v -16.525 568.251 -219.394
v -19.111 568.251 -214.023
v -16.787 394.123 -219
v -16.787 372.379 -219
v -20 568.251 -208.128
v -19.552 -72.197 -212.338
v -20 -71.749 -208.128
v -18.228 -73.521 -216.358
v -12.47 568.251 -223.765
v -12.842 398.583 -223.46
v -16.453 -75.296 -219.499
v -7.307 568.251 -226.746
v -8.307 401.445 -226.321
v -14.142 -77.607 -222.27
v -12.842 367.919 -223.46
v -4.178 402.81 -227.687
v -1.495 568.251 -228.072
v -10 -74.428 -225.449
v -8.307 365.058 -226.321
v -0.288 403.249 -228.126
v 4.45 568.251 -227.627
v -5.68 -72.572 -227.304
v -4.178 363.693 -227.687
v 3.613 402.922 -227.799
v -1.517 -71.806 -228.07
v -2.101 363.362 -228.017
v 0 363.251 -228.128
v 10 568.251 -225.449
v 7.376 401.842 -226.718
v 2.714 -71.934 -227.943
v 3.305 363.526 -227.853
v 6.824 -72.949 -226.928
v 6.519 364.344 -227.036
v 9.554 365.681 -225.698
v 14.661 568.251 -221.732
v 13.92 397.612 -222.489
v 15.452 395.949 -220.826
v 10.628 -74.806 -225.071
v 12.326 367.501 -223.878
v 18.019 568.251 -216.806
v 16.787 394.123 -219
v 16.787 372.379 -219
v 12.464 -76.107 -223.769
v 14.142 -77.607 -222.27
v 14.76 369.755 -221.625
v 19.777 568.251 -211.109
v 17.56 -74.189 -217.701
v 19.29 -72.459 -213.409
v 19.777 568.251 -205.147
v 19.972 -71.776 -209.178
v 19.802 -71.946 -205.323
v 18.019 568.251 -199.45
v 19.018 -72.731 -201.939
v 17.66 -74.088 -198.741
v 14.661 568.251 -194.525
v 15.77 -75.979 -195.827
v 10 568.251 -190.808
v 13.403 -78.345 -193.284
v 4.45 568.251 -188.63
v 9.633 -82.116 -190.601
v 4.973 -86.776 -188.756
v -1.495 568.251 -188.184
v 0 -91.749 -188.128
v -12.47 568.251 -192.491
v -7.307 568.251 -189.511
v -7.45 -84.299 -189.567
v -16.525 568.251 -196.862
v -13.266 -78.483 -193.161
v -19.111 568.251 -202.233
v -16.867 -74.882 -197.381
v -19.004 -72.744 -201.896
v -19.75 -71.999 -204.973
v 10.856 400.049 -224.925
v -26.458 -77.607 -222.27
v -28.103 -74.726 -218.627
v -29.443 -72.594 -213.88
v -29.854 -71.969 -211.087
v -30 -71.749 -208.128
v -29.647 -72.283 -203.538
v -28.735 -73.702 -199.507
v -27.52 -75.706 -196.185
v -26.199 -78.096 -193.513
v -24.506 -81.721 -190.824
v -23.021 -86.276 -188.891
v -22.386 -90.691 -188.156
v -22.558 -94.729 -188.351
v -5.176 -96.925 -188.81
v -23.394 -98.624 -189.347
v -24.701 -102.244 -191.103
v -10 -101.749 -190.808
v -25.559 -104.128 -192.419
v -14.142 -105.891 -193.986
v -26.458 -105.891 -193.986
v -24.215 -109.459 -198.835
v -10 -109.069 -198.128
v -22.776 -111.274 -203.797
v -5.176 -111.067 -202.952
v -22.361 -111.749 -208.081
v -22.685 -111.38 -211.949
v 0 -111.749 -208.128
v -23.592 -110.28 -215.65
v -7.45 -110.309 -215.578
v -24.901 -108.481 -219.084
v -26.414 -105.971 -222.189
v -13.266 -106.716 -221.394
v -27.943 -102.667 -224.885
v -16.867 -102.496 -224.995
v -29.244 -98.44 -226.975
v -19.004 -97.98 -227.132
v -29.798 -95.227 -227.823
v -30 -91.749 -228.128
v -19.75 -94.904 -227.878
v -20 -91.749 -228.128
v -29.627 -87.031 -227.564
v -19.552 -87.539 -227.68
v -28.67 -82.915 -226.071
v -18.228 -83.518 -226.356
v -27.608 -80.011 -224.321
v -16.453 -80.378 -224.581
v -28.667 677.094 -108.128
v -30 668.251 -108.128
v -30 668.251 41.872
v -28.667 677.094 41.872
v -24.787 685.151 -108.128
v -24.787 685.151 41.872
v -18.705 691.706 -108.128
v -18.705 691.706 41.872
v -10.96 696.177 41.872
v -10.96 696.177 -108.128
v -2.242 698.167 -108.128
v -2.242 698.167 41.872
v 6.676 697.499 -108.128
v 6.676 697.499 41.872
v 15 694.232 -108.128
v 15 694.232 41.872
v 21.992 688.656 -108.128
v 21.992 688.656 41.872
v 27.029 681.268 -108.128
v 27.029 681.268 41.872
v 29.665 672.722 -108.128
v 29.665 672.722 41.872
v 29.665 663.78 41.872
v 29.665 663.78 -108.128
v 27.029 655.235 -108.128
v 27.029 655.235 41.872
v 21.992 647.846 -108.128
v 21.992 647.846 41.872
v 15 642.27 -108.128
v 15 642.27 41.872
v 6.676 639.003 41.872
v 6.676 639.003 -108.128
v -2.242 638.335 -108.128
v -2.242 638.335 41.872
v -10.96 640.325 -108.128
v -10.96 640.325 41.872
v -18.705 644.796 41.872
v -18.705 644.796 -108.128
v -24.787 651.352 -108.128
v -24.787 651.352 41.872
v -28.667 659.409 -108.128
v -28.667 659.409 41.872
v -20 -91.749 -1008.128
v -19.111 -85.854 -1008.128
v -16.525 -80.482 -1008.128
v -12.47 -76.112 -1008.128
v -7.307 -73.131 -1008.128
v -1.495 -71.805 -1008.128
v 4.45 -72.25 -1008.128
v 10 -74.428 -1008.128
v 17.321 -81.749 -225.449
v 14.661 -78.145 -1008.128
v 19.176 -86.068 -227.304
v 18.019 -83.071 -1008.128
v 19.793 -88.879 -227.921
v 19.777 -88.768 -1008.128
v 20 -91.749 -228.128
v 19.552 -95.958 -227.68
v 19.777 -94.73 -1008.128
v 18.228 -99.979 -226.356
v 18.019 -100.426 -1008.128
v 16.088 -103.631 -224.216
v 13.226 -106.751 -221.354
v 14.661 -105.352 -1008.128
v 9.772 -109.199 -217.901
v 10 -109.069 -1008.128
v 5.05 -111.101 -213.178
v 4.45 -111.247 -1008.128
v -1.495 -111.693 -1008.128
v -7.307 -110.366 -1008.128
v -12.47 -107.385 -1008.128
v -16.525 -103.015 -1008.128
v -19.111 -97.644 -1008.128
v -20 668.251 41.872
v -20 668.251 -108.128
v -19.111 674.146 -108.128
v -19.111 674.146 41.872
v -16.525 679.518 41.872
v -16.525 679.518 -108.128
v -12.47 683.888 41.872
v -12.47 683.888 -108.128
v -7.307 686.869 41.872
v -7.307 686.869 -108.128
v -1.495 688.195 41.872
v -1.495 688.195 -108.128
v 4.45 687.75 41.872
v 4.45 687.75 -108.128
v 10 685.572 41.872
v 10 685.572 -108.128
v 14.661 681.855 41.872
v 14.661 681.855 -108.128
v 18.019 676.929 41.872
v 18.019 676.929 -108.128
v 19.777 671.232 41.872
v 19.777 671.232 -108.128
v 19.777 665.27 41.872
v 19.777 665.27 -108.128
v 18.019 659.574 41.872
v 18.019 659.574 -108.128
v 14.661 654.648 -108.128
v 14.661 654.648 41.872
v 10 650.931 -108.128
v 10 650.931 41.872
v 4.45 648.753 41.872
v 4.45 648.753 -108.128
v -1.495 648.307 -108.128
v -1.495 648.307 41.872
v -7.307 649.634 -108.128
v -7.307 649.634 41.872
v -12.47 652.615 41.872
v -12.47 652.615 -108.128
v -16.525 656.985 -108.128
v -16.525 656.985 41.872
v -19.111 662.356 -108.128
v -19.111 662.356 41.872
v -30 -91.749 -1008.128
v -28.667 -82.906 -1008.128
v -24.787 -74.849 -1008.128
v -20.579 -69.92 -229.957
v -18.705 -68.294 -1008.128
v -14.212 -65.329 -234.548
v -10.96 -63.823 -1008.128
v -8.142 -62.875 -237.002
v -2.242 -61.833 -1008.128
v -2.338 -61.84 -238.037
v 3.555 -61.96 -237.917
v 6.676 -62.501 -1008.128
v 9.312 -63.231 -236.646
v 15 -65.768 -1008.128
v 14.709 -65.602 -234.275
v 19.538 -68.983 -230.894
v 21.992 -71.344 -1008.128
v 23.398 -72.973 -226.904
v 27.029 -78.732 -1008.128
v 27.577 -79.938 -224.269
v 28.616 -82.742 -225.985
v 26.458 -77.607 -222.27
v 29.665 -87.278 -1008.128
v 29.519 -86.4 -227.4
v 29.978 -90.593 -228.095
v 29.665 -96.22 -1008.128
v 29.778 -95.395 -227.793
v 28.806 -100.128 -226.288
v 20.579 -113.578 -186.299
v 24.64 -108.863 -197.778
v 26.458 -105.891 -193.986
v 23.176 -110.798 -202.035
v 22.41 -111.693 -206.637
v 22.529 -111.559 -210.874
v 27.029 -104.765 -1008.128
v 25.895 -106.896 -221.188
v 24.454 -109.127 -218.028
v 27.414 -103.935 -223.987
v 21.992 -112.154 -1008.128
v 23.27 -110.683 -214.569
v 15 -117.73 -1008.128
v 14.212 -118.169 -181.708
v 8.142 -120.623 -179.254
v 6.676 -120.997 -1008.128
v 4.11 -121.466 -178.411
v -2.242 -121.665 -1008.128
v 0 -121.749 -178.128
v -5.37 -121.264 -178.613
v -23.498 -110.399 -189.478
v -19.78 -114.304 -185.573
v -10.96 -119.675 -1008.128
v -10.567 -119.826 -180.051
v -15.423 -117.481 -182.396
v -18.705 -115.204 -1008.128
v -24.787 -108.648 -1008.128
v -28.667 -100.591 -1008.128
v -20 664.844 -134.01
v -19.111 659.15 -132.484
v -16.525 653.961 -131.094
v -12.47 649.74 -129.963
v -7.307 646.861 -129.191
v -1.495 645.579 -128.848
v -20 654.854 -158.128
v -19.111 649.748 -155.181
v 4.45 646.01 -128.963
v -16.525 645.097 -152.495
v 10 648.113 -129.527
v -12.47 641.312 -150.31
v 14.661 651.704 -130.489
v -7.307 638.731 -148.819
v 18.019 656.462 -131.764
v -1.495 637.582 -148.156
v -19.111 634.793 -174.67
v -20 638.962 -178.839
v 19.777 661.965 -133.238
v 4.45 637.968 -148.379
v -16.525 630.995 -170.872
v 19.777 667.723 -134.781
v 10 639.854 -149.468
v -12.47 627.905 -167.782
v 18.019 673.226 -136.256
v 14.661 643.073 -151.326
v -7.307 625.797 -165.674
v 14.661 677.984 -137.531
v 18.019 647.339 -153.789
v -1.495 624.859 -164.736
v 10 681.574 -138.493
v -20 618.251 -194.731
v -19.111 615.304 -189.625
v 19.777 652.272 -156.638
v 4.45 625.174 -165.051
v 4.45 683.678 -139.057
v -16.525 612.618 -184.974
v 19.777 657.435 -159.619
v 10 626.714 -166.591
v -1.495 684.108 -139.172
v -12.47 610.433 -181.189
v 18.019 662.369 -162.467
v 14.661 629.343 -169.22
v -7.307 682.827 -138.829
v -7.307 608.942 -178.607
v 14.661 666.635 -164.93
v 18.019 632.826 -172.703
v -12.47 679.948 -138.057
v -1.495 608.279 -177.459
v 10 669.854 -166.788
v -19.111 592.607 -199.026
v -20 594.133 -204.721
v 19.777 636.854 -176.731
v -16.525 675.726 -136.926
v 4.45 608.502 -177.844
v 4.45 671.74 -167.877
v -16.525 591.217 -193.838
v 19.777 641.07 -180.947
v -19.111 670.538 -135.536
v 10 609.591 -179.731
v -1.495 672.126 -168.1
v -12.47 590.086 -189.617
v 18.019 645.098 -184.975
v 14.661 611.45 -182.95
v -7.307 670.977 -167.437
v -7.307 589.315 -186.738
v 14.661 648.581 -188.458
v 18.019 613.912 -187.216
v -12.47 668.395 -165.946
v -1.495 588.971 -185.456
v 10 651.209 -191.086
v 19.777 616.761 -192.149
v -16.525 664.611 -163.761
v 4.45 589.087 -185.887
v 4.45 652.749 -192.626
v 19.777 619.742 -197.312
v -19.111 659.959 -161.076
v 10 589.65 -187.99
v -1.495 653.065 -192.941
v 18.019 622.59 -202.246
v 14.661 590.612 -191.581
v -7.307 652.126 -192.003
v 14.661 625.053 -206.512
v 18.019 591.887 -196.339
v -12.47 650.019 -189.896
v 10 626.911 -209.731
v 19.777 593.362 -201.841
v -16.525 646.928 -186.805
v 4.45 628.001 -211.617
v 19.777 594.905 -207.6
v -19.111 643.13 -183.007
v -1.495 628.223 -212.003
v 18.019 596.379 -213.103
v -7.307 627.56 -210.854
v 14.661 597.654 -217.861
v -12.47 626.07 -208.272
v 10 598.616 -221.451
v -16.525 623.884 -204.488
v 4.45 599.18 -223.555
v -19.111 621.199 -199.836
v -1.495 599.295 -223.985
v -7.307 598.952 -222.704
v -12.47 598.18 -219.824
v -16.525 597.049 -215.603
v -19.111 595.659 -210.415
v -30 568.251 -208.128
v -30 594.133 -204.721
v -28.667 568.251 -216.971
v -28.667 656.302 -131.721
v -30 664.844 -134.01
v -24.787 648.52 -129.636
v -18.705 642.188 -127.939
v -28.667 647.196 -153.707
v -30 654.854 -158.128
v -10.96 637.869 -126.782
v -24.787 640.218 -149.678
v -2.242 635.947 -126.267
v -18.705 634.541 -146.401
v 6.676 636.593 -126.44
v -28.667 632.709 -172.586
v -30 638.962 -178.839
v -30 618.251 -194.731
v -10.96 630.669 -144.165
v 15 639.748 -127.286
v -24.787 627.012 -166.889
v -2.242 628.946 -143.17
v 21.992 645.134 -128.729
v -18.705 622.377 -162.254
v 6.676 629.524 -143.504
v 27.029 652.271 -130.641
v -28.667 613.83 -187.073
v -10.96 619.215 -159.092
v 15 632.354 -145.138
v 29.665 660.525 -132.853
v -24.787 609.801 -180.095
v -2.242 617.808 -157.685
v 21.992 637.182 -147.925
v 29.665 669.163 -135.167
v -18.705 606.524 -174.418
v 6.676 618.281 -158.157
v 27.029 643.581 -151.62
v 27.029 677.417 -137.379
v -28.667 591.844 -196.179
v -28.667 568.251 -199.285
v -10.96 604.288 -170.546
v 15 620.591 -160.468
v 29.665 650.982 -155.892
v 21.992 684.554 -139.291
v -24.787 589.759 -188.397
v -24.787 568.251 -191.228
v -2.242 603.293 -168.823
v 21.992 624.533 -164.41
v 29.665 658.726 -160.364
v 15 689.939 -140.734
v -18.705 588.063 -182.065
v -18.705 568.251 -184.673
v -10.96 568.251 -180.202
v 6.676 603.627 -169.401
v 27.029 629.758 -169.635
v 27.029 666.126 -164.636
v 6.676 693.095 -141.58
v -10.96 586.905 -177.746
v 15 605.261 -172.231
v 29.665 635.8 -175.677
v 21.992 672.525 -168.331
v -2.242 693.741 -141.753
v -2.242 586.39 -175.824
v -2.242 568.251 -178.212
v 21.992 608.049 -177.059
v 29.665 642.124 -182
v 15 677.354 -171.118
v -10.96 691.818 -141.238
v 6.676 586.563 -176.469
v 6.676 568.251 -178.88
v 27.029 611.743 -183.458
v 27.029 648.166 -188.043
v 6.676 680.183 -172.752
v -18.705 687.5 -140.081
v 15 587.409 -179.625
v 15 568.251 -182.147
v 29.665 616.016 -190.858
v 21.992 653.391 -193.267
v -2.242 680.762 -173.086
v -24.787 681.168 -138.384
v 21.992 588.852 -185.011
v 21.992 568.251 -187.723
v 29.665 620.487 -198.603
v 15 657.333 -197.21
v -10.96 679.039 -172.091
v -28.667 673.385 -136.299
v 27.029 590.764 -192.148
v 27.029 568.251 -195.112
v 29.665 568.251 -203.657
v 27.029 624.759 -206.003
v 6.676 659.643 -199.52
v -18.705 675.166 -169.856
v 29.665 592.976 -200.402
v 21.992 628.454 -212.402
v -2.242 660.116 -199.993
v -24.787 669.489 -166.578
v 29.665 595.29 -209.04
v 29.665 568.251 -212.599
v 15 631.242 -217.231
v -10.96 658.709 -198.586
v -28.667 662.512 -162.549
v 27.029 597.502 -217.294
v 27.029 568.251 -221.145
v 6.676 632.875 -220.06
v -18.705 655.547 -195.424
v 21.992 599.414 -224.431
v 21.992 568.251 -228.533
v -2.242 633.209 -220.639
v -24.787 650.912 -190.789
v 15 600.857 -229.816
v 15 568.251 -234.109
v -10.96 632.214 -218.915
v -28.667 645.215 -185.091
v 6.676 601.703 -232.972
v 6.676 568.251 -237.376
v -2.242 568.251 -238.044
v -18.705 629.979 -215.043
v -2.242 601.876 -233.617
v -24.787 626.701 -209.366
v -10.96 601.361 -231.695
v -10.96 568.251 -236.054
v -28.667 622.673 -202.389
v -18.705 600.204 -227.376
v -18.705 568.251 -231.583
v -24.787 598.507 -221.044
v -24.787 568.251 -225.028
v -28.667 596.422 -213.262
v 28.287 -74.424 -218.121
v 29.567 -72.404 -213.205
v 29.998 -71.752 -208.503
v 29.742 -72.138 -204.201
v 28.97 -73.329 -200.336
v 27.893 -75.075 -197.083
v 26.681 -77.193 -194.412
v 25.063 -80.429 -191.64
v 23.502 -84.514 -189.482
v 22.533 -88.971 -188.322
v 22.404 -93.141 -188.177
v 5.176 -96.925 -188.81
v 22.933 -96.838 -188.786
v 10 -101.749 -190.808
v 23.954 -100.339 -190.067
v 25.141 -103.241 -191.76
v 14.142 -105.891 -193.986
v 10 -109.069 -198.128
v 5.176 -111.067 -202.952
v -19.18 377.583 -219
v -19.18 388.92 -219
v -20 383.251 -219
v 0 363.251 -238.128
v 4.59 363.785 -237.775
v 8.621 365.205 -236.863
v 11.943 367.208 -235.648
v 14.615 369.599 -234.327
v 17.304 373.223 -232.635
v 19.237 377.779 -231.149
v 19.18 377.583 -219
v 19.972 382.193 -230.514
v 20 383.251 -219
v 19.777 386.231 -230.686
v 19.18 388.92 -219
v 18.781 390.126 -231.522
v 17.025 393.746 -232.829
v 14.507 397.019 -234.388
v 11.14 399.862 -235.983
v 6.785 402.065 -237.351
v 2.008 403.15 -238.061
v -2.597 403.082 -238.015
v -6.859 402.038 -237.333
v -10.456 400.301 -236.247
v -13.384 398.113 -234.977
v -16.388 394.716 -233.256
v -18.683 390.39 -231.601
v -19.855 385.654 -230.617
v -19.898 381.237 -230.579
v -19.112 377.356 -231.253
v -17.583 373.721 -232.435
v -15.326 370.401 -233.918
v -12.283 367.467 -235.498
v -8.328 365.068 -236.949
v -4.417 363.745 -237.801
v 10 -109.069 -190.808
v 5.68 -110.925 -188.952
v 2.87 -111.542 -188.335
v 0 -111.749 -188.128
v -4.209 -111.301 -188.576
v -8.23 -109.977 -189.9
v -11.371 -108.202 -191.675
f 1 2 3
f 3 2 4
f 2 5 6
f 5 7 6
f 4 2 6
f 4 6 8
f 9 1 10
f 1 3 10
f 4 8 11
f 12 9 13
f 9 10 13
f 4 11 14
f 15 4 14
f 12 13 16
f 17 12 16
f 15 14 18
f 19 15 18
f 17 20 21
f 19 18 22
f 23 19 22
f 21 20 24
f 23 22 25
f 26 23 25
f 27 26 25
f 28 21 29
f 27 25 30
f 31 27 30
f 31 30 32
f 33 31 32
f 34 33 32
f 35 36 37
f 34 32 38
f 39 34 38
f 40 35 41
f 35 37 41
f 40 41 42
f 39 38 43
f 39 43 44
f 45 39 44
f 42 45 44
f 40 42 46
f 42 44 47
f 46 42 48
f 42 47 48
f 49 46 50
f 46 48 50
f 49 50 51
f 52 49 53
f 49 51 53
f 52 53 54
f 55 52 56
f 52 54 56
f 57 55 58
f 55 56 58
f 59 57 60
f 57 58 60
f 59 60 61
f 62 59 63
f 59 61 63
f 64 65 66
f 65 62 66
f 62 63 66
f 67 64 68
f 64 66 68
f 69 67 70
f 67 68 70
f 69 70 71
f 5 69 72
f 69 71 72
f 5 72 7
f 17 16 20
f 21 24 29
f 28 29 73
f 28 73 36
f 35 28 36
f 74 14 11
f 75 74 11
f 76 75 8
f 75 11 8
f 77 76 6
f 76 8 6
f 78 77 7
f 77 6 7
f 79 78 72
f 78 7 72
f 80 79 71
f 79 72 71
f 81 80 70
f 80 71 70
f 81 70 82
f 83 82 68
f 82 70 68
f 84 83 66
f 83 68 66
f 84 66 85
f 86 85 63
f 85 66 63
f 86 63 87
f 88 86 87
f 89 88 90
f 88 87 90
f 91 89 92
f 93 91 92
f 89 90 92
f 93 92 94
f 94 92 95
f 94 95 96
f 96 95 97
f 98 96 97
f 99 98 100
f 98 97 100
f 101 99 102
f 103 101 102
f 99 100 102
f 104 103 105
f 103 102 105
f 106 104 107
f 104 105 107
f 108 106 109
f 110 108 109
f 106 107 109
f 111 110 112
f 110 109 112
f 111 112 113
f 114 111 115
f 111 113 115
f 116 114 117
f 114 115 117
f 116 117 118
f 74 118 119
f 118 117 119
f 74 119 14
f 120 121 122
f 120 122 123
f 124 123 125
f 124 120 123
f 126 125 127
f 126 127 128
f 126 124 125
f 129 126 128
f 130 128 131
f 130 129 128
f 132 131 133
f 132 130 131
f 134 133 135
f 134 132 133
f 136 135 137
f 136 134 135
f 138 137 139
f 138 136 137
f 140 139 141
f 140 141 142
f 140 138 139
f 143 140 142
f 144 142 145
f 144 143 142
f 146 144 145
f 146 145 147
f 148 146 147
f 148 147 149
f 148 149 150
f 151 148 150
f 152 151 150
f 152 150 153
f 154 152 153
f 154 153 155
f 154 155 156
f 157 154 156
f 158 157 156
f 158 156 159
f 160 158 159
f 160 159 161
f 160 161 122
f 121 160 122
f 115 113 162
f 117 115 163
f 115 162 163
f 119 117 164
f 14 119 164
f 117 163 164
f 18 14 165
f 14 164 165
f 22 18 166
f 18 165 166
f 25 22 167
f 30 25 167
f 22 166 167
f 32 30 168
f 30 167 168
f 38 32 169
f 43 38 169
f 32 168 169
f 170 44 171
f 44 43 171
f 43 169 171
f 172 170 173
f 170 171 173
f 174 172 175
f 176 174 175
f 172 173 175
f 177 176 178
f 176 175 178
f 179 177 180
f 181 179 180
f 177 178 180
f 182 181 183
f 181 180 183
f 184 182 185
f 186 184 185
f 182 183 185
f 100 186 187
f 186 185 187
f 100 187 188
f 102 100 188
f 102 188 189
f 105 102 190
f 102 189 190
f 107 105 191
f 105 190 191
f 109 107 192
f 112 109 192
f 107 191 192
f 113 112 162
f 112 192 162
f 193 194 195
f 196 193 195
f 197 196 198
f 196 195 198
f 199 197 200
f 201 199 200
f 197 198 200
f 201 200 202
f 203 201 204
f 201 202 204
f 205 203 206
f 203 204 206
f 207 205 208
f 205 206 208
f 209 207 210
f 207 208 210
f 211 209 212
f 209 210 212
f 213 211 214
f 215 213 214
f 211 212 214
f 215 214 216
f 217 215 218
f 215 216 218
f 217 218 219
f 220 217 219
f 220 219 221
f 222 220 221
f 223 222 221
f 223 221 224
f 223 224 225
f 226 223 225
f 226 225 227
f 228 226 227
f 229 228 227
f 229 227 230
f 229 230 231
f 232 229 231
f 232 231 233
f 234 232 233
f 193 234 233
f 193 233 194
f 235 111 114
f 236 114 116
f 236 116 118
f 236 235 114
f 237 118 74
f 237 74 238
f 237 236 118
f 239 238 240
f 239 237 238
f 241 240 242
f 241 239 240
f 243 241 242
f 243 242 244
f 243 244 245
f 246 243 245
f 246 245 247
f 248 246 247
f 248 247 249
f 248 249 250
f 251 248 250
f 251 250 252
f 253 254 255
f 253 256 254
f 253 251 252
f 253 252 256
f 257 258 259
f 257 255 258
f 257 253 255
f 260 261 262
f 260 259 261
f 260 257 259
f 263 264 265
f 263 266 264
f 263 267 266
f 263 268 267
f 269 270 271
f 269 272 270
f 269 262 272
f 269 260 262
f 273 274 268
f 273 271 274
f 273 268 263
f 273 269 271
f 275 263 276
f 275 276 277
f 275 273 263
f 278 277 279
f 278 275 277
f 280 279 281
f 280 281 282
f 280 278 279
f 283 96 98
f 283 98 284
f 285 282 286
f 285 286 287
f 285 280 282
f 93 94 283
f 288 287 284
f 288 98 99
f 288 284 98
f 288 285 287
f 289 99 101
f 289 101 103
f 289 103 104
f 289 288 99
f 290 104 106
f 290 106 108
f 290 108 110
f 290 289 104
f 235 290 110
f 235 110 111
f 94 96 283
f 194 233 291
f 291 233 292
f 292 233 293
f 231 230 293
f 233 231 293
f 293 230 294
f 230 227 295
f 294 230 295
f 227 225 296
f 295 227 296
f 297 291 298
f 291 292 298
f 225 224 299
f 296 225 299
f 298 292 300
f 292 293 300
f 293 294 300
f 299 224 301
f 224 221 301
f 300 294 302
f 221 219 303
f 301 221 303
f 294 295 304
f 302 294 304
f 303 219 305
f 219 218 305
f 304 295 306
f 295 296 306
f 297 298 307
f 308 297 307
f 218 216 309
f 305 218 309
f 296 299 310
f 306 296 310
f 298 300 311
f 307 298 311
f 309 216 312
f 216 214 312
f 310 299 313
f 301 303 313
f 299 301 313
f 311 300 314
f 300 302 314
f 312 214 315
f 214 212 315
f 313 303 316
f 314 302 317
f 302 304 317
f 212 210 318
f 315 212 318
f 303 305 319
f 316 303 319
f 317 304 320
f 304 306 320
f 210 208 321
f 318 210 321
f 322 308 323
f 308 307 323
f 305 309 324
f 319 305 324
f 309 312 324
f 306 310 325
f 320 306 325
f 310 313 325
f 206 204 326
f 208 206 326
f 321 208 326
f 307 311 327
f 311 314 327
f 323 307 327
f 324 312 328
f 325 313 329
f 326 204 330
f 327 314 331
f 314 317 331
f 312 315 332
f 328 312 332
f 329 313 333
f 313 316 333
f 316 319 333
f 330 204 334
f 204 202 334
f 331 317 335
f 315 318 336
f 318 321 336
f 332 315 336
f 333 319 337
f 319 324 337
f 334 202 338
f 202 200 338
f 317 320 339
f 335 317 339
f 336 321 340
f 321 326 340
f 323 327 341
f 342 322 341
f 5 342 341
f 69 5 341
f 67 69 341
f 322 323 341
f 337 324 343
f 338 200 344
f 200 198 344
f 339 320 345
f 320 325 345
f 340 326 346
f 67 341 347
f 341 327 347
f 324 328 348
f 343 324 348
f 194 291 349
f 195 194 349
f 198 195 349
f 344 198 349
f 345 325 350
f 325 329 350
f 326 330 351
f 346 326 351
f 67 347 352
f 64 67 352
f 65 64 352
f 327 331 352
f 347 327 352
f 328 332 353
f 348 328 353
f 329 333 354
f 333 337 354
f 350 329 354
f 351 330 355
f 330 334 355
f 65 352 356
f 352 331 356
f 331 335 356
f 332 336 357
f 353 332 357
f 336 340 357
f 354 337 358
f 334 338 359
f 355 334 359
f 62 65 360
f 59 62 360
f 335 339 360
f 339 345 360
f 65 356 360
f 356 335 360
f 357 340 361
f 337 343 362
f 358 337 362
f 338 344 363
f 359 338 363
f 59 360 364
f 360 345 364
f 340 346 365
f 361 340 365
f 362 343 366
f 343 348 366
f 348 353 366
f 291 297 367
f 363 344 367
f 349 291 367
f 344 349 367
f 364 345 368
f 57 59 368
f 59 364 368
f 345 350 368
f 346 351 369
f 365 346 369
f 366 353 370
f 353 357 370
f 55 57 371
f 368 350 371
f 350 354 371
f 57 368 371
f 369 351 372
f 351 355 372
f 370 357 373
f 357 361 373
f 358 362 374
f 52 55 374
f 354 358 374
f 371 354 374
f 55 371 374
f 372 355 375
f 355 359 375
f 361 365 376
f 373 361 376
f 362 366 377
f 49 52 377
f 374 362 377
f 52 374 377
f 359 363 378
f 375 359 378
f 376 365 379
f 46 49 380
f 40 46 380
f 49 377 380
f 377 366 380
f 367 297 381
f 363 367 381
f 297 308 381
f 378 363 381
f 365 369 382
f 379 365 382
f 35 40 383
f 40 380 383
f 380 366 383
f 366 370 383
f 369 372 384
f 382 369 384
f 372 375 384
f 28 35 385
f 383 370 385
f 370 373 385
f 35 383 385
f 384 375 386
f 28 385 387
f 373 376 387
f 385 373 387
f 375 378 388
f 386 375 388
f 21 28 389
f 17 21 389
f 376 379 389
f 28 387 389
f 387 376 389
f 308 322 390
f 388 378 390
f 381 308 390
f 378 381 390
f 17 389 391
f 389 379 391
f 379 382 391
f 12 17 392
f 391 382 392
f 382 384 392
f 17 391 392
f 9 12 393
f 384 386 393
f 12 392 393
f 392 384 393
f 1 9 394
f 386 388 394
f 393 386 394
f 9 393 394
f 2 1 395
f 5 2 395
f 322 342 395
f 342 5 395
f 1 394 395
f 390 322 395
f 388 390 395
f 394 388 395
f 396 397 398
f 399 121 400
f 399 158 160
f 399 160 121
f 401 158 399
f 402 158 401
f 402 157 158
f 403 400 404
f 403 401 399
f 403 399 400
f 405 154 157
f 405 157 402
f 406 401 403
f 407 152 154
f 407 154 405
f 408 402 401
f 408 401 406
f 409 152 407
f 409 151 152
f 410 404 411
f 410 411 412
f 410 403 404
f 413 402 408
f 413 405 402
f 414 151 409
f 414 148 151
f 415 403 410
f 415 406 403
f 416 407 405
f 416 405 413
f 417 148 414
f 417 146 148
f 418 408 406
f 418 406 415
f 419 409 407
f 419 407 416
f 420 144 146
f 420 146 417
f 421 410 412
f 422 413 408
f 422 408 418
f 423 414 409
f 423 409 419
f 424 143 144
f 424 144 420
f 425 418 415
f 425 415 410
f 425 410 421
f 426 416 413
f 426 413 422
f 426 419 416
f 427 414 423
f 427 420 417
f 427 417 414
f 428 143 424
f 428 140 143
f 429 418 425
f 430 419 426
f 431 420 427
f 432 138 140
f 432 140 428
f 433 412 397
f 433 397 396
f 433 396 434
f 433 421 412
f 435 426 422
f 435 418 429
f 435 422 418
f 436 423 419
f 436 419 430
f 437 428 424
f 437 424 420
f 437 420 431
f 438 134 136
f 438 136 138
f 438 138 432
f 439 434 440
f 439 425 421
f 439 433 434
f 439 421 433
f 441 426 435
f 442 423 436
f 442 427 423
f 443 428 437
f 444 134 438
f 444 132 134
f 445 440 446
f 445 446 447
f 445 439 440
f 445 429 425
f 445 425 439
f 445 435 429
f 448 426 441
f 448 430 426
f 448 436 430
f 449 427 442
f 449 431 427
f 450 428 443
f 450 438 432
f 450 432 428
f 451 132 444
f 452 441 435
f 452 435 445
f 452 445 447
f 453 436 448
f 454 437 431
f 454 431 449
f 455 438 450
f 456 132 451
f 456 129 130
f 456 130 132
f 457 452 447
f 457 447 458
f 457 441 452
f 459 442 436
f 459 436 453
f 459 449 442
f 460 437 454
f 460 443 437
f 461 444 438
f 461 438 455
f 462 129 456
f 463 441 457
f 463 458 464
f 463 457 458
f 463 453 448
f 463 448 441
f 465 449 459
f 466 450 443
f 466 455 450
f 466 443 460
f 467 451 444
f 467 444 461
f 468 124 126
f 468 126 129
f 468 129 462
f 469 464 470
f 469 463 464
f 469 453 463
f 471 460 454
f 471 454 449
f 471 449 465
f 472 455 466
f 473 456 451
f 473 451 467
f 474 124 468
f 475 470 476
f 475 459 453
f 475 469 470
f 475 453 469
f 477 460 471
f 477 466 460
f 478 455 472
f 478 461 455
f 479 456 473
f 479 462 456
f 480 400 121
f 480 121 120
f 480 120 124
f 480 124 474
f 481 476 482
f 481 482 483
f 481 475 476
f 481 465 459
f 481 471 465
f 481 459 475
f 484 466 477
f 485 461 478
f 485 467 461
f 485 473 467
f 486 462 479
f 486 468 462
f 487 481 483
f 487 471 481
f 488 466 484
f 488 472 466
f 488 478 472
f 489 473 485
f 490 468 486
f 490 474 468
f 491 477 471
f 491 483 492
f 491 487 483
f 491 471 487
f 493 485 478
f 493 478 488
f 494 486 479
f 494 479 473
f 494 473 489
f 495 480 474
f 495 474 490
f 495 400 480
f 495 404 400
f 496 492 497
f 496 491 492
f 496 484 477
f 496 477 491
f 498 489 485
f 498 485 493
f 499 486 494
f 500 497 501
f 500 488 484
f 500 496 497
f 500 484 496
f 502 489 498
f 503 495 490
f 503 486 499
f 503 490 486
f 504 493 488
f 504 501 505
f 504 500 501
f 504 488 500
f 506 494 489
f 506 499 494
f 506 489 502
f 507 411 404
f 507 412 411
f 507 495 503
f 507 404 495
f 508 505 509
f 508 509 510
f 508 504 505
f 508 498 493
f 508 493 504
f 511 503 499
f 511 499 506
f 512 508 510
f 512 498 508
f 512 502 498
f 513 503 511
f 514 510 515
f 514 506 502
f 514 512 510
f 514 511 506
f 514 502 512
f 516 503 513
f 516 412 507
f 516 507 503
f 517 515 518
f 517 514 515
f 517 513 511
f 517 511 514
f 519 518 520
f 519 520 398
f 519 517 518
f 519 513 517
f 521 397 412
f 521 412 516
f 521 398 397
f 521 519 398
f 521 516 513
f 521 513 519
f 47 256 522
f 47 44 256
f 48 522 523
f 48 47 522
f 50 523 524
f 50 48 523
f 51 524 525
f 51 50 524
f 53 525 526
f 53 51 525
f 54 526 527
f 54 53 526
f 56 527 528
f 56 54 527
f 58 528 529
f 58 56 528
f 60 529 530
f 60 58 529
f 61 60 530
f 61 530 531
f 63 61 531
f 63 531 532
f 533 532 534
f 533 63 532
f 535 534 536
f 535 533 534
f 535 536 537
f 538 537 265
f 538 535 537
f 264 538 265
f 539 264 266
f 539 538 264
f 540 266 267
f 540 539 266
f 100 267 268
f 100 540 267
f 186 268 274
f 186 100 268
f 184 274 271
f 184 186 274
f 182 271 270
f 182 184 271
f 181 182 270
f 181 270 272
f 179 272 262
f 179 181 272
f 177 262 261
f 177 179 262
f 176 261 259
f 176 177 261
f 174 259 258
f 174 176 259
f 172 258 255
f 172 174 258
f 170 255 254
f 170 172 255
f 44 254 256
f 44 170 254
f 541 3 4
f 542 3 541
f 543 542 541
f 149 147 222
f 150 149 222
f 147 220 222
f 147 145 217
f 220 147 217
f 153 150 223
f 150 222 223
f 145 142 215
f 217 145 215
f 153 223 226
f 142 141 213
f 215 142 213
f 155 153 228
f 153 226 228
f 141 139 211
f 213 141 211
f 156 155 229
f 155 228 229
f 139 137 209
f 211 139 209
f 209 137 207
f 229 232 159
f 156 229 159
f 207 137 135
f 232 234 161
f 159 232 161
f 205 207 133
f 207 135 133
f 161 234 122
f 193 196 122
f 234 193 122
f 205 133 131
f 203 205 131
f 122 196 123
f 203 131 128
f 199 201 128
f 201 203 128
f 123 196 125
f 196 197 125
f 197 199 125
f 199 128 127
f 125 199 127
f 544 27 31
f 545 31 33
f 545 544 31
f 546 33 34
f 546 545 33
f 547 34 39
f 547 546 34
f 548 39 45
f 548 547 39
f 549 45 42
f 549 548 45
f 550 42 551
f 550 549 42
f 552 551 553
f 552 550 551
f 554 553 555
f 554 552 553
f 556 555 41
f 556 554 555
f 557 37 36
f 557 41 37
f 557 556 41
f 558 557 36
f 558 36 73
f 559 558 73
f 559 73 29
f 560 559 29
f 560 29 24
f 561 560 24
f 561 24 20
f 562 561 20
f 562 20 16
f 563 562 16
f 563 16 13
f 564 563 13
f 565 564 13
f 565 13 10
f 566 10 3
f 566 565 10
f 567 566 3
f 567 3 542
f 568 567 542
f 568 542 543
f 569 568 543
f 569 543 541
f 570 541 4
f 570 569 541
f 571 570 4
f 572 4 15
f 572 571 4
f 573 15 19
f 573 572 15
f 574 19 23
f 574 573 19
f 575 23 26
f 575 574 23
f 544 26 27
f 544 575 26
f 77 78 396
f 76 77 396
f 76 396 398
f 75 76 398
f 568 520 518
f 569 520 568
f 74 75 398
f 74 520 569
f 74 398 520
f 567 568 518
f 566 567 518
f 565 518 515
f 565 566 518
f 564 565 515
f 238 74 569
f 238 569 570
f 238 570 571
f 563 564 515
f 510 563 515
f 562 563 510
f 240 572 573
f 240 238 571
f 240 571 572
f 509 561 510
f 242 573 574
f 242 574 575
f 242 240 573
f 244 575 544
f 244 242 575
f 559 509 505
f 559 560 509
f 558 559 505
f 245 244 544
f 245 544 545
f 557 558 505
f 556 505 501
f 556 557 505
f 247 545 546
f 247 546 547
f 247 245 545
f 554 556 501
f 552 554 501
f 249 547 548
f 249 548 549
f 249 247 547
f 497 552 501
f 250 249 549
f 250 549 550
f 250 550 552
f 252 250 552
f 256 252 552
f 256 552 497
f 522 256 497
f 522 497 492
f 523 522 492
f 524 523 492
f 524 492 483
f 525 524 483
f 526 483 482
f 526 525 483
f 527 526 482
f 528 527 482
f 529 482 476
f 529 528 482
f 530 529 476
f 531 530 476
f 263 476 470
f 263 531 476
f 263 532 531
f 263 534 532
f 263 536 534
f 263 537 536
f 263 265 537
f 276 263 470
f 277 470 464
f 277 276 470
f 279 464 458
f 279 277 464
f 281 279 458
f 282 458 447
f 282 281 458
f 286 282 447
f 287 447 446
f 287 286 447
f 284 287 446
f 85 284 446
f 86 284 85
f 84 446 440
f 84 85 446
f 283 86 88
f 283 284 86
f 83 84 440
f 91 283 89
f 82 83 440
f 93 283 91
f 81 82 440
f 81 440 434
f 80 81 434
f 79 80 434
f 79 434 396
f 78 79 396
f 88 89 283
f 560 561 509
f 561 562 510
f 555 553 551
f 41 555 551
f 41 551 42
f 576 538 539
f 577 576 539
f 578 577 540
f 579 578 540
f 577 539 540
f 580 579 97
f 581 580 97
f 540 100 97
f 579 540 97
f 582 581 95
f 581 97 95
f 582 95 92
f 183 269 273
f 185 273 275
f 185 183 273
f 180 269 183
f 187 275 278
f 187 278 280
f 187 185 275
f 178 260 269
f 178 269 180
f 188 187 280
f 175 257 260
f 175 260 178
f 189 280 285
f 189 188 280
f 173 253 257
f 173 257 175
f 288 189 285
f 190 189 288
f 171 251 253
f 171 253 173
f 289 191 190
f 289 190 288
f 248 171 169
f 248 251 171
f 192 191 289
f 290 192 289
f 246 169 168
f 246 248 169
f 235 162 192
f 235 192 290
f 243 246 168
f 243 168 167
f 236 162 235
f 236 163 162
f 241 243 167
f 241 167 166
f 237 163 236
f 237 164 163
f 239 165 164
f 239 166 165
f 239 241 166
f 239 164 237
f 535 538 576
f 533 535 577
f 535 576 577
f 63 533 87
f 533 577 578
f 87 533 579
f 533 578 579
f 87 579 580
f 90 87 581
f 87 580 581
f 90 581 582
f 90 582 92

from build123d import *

# Parameters (mm, degrees)
SWEEP_THIN1_PROFILE_R   = 30
SWEEP_THIN1_PROFILE_R_2 = 20
CUT_EXTRUDE1_DEPTH      = 1227.693525611
CUT_EXTRUDE1_DEPTH_BACK = 1227.693525611
SKETCH3_R               = 20
SKETCH5_R               = 20
CUT_EXTRUDE3_DEPTH      = 111


with BuildPart() as part:
    # Sweep-Thin1: sweep along a path in Sketch1
    with BuildLine(Plane(origin=(0, 0, 0), x_dir=(0, 0, -1), z_dir=(1, 0, 0))) as sweep_thin1_path:
        Line((-41.871921182, 668.251231527), (108.128078818, 668.251231527))
        ThreePointArc((108.128078818, 668.251231527), (178.838756936, 638.961909646), (208.128078818, 568.251231527))
        Line((208.128078818, 568.251231527), (208.128078818, -91.748768473))
        Line((208.128078818, -91.748768473), (1008.128078818, -91.748768473))
    # Sweep-Thin1 profile (on start of the path) → Sweep-Thin1 (sweep)
    with BuildSketch(Plane(origin=(0, 668.251231527, 41.871921182), x_dir=(-1, 0, 0), z_dir=(0, 0, -1))):
        Circle(SWEEP_THIN1_PROFILE_R)
        Circle(SWEEP_THIN1_PROFILE_R_2, mode=Mode.SUBTRACT)
    sweep(path=sweep_thin1_path.line, transition=Transition.RIGHT)

    # Sketch3 → Cut-Extrude1 (cut, two sides: drawn at the far end of the back side and taken through both)
    with BuildSketch(Plane(origin=(0, 0, 0), x_dir=(0, 0, -1), z_dir=(1, 0, 0)).offset(-CUT_EXTRUDE1_DEPTH_BACK)):
        with Locations((208.128078818, -91.748768473)):
            Circle(SKETCH3_R)
    extrude(amount=CUT_EXTRUDE1_DEPTH + CUT_EXTRUDE1_DEPTH_BACK, mode=Mode.SUBTRACT)

    # Sketch5 → Cut-Extrude3 (cut)
    with BuildSketch(Plane.XY.offset(-330)):
        with Locations((0, 383.251231527)):
            Circle(SKETCH5_R)
    extrude(amount=CUT_EXTRUDE3_DEPTH, mode=Mode.SUBTRACT)


solid = part.part
